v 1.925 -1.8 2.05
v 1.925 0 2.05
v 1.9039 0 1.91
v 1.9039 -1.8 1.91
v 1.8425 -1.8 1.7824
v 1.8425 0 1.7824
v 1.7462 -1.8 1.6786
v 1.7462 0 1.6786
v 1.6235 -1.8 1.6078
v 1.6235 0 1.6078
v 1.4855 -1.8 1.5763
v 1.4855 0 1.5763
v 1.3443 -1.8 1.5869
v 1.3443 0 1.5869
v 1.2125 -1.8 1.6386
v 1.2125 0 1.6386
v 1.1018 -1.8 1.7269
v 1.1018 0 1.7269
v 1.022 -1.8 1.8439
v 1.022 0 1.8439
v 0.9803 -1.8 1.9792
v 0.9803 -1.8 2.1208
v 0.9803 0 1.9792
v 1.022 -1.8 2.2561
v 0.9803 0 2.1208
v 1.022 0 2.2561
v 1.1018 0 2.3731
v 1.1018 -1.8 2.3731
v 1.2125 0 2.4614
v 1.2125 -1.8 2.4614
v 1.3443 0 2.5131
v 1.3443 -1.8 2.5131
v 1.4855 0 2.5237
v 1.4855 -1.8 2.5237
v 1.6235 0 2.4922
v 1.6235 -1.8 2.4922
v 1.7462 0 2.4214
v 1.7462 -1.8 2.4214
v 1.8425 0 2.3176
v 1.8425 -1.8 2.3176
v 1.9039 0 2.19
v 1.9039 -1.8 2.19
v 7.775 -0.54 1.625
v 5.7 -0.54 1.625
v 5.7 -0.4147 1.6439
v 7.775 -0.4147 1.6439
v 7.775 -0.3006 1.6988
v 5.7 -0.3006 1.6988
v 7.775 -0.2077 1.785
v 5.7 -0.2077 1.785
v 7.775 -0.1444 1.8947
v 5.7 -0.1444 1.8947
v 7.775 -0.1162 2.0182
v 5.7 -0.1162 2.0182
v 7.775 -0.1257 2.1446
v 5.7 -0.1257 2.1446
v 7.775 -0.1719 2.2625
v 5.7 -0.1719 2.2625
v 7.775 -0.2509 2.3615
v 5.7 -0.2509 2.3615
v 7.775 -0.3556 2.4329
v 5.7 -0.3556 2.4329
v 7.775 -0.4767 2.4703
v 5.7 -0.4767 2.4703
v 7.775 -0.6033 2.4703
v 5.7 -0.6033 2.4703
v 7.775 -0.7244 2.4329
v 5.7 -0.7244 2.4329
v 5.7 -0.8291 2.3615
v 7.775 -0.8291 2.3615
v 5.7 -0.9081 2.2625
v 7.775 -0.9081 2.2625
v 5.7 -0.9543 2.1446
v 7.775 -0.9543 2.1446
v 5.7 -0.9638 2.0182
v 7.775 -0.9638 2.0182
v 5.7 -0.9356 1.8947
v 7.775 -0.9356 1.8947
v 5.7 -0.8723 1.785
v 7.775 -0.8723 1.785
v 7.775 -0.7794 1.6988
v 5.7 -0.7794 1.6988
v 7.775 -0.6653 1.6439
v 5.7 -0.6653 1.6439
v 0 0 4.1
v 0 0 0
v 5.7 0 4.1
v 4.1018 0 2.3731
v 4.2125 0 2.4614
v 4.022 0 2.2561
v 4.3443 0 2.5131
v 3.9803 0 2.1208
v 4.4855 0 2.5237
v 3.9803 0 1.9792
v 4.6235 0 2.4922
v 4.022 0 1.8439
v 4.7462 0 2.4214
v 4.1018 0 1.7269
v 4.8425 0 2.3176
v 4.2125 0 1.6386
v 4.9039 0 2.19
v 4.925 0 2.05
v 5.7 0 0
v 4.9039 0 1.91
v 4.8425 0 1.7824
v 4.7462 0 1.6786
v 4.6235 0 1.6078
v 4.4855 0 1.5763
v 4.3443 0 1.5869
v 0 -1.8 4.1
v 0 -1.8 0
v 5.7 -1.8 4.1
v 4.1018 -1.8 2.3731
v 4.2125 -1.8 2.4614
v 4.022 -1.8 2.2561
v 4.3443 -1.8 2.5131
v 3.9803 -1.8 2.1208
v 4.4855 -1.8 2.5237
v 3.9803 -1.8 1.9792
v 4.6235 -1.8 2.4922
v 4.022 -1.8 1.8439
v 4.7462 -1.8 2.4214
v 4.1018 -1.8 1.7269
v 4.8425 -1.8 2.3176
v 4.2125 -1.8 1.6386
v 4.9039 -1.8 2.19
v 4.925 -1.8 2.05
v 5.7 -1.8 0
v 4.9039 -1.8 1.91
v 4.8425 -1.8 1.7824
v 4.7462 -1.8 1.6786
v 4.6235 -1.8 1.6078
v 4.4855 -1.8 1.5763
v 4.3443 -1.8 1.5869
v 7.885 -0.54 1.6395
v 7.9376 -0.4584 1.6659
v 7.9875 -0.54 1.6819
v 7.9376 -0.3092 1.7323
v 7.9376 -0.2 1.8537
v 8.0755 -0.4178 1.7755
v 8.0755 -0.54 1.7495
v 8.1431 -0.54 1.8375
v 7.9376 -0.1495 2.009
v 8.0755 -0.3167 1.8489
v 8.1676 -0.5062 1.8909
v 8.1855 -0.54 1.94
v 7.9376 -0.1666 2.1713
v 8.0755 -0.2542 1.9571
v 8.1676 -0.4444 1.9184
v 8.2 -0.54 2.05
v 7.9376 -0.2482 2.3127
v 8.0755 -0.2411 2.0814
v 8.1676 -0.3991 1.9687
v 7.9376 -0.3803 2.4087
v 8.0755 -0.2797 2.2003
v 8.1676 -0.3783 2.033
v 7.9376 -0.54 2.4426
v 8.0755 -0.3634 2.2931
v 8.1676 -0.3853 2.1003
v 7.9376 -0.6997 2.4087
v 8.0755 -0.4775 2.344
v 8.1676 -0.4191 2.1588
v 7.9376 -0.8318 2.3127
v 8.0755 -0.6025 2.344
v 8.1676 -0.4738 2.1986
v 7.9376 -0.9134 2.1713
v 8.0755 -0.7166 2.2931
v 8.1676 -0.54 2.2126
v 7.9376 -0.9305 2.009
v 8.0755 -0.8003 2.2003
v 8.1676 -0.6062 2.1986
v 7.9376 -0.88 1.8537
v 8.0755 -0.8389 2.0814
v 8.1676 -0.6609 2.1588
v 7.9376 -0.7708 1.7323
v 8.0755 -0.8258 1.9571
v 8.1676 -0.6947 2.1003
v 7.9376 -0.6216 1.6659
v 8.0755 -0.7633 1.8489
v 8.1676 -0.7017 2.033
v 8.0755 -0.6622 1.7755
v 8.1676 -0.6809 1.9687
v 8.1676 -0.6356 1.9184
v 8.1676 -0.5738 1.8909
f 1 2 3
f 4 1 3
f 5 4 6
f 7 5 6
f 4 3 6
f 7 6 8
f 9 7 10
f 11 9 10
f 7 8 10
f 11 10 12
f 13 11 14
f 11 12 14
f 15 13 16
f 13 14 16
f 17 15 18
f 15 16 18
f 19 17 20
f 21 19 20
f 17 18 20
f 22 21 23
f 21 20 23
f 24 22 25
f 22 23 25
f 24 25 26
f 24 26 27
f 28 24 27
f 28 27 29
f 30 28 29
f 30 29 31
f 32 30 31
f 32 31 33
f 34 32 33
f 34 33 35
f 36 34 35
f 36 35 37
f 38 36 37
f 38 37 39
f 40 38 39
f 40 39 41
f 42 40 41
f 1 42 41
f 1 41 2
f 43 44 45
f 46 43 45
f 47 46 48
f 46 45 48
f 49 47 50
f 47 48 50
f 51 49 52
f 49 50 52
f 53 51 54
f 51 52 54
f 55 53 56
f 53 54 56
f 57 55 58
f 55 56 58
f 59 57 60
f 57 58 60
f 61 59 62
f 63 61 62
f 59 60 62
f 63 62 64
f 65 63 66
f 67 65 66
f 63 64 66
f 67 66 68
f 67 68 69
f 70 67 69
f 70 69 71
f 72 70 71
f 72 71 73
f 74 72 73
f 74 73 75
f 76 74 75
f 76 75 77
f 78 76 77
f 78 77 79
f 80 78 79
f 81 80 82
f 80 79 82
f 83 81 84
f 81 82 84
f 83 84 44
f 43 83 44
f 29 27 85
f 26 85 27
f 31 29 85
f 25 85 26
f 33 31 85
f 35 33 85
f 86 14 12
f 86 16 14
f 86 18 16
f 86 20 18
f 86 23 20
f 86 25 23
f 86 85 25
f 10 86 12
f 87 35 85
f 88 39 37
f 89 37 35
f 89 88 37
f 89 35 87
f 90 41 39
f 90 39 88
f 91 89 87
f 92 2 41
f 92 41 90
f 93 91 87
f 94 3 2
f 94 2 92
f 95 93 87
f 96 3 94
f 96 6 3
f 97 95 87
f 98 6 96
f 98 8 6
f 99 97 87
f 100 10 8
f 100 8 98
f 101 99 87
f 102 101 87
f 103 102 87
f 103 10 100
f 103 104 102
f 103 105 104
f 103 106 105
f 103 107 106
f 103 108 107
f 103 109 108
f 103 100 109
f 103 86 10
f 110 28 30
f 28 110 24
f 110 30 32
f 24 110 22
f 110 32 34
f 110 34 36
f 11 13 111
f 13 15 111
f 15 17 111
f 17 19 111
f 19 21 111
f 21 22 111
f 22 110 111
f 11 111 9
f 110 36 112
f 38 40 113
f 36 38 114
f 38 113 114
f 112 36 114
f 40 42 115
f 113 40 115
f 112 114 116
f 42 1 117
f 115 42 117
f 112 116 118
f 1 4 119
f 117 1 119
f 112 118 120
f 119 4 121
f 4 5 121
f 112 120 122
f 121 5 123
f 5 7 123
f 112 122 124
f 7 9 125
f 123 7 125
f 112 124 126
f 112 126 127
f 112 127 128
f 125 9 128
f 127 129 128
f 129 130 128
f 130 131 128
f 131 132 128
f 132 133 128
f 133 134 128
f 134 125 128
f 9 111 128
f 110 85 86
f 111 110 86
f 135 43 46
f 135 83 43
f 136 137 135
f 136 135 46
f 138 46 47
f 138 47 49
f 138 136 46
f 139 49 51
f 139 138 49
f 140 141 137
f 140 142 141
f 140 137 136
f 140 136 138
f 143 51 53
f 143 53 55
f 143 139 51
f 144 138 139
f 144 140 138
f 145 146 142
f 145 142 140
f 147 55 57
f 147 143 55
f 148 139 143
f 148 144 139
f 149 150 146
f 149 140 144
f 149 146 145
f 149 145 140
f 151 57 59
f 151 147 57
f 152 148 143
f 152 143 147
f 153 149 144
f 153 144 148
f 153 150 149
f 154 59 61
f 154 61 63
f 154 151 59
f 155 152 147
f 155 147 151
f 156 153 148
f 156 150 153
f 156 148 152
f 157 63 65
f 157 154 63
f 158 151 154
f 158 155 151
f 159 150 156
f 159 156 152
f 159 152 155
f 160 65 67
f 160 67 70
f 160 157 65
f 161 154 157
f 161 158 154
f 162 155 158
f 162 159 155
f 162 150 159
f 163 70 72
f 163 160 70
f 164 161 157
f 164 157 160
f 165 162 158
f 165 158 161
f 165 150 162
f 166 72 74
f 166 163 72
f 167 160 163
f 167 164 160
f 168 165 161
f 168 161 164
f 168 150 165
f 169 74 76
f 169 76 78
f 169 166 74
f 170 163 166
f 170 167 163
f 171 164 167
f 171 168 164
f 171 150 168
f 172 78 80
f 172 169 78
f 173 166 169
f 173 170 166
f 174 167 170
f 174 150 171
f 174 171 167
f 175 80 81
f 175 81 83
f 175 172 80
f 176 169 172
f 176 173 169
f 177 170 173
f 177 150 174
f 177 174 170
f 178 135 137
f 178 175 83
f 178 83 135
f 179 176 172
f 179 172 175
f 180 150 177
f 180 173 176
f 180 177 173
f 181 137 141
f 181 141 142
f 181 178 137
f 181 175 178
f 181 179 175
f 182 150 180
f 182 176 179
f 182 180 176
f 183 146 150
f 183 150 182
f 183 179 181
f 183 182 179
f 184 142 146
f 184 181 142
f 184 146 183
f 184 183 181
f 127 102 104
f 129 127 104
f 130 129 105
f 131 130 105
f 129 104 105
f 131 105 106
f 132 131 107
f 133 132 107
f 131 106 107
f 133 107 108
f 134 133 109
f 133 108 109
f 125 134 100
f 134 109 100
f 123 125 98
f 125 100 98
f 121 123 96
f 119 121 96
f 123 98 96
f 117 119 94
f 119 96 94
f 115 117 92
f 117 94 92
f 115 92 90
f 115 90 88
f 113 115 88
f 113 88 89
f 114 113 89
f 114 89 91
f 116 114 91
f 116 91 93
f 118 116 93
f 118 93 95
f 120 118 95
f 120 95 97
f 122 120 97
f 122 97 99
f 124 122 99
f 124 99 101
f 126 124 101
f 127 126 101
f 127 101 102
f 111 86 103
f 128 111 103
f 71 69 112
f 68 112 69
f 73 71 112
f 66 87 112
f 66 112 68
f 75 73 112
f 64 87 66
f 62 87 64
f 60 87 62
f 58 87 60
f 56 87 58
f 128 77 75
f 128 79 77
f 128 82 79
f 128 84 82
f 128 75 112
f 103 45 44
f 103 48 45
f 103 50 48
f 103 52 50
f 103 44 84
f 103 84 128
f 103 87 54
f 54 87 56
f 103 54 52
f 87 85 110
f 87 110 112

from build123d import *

# Parameters (mm, degrees)
SKETCH1_W                    = 5.7
SKETCH1_H                    = 4.1
BOSS_EXTRUDE1_DEPTH          = 1.8
SKETCH3_R                    = 0.425
BOSS_EXTRUDE3_DEPTH          = 2.5
FILLET2_R                    = 0.425
M1_2X0_25_TAPPED_HOLE1_D     = 0.95
M1_2X0_25_TAPPED_HOLE1_DEPTH = 3.15
M1_2X0_25_TAPPED_HOLE1_TIP   = 0.285408794


with BuildPart() as part:
    # Sketch1 → Boss-Extrude1 (new body)
    with BuildSketch(Plane(origin=(0, 0, 0), x_dir=(1, 0, 0), z_dir=(0, 1, 0))):
        with Locations((2.85, -2.05)):
            Rectangle(SKETCH1_W, SKETCH1_H)
    extrude(amount=-BOSS_EXTRUDE1_DEPTH)

    # Sketch3 → Boss-Extrude3 (add)
    with BuildSketch(Plane(origin=(5.7, 0, 0), x_dir=(0, 0, -1), z_dir=(1, 0, 0))):
        with Locations((-2.05, -0.54)):
            Circle(SKETCH3_R)
    extrude(amount=BOSS_EXTRUDE3_DEPTH)

    # Fillet2
    fillet2_edges = [part.edges().sort_by_distance(p)[0] for p in [
        (8.2, -0.54, 2.475),
    ]]
    fillet(fillet2_edges, radius=FILLET2_R)

    # M1.2x0.25 Tapped Hole1
    with Locations(Plane(origin=(0, -1.8, 0), x_dir=(-1, 0, 0), z_dir=(0, -1, 0))):
        with Locations((-4.45, -2.05), (-1.45, -2.05)):
            Hole(M1_2X0_25_TAPPED_HOLE1_D / 2, depth=M1_2X0_25_TAPPED_HOLE1_DEPTH)
            with Locations((0, 0, -(M1_2X0_25_TAPPED_HOLE1_DEPTH + M1_2X0_25_TAPPED_HOLE1_TIP / 2))):  # 118° drill point
                Cone(0, M1_2X0_25_TAPPED_HOLE1_D / 2, M1_2X0_25_TAPPED_HOLE1_TIP, mode=Mode.SUBTRACT)


solid = part.part
